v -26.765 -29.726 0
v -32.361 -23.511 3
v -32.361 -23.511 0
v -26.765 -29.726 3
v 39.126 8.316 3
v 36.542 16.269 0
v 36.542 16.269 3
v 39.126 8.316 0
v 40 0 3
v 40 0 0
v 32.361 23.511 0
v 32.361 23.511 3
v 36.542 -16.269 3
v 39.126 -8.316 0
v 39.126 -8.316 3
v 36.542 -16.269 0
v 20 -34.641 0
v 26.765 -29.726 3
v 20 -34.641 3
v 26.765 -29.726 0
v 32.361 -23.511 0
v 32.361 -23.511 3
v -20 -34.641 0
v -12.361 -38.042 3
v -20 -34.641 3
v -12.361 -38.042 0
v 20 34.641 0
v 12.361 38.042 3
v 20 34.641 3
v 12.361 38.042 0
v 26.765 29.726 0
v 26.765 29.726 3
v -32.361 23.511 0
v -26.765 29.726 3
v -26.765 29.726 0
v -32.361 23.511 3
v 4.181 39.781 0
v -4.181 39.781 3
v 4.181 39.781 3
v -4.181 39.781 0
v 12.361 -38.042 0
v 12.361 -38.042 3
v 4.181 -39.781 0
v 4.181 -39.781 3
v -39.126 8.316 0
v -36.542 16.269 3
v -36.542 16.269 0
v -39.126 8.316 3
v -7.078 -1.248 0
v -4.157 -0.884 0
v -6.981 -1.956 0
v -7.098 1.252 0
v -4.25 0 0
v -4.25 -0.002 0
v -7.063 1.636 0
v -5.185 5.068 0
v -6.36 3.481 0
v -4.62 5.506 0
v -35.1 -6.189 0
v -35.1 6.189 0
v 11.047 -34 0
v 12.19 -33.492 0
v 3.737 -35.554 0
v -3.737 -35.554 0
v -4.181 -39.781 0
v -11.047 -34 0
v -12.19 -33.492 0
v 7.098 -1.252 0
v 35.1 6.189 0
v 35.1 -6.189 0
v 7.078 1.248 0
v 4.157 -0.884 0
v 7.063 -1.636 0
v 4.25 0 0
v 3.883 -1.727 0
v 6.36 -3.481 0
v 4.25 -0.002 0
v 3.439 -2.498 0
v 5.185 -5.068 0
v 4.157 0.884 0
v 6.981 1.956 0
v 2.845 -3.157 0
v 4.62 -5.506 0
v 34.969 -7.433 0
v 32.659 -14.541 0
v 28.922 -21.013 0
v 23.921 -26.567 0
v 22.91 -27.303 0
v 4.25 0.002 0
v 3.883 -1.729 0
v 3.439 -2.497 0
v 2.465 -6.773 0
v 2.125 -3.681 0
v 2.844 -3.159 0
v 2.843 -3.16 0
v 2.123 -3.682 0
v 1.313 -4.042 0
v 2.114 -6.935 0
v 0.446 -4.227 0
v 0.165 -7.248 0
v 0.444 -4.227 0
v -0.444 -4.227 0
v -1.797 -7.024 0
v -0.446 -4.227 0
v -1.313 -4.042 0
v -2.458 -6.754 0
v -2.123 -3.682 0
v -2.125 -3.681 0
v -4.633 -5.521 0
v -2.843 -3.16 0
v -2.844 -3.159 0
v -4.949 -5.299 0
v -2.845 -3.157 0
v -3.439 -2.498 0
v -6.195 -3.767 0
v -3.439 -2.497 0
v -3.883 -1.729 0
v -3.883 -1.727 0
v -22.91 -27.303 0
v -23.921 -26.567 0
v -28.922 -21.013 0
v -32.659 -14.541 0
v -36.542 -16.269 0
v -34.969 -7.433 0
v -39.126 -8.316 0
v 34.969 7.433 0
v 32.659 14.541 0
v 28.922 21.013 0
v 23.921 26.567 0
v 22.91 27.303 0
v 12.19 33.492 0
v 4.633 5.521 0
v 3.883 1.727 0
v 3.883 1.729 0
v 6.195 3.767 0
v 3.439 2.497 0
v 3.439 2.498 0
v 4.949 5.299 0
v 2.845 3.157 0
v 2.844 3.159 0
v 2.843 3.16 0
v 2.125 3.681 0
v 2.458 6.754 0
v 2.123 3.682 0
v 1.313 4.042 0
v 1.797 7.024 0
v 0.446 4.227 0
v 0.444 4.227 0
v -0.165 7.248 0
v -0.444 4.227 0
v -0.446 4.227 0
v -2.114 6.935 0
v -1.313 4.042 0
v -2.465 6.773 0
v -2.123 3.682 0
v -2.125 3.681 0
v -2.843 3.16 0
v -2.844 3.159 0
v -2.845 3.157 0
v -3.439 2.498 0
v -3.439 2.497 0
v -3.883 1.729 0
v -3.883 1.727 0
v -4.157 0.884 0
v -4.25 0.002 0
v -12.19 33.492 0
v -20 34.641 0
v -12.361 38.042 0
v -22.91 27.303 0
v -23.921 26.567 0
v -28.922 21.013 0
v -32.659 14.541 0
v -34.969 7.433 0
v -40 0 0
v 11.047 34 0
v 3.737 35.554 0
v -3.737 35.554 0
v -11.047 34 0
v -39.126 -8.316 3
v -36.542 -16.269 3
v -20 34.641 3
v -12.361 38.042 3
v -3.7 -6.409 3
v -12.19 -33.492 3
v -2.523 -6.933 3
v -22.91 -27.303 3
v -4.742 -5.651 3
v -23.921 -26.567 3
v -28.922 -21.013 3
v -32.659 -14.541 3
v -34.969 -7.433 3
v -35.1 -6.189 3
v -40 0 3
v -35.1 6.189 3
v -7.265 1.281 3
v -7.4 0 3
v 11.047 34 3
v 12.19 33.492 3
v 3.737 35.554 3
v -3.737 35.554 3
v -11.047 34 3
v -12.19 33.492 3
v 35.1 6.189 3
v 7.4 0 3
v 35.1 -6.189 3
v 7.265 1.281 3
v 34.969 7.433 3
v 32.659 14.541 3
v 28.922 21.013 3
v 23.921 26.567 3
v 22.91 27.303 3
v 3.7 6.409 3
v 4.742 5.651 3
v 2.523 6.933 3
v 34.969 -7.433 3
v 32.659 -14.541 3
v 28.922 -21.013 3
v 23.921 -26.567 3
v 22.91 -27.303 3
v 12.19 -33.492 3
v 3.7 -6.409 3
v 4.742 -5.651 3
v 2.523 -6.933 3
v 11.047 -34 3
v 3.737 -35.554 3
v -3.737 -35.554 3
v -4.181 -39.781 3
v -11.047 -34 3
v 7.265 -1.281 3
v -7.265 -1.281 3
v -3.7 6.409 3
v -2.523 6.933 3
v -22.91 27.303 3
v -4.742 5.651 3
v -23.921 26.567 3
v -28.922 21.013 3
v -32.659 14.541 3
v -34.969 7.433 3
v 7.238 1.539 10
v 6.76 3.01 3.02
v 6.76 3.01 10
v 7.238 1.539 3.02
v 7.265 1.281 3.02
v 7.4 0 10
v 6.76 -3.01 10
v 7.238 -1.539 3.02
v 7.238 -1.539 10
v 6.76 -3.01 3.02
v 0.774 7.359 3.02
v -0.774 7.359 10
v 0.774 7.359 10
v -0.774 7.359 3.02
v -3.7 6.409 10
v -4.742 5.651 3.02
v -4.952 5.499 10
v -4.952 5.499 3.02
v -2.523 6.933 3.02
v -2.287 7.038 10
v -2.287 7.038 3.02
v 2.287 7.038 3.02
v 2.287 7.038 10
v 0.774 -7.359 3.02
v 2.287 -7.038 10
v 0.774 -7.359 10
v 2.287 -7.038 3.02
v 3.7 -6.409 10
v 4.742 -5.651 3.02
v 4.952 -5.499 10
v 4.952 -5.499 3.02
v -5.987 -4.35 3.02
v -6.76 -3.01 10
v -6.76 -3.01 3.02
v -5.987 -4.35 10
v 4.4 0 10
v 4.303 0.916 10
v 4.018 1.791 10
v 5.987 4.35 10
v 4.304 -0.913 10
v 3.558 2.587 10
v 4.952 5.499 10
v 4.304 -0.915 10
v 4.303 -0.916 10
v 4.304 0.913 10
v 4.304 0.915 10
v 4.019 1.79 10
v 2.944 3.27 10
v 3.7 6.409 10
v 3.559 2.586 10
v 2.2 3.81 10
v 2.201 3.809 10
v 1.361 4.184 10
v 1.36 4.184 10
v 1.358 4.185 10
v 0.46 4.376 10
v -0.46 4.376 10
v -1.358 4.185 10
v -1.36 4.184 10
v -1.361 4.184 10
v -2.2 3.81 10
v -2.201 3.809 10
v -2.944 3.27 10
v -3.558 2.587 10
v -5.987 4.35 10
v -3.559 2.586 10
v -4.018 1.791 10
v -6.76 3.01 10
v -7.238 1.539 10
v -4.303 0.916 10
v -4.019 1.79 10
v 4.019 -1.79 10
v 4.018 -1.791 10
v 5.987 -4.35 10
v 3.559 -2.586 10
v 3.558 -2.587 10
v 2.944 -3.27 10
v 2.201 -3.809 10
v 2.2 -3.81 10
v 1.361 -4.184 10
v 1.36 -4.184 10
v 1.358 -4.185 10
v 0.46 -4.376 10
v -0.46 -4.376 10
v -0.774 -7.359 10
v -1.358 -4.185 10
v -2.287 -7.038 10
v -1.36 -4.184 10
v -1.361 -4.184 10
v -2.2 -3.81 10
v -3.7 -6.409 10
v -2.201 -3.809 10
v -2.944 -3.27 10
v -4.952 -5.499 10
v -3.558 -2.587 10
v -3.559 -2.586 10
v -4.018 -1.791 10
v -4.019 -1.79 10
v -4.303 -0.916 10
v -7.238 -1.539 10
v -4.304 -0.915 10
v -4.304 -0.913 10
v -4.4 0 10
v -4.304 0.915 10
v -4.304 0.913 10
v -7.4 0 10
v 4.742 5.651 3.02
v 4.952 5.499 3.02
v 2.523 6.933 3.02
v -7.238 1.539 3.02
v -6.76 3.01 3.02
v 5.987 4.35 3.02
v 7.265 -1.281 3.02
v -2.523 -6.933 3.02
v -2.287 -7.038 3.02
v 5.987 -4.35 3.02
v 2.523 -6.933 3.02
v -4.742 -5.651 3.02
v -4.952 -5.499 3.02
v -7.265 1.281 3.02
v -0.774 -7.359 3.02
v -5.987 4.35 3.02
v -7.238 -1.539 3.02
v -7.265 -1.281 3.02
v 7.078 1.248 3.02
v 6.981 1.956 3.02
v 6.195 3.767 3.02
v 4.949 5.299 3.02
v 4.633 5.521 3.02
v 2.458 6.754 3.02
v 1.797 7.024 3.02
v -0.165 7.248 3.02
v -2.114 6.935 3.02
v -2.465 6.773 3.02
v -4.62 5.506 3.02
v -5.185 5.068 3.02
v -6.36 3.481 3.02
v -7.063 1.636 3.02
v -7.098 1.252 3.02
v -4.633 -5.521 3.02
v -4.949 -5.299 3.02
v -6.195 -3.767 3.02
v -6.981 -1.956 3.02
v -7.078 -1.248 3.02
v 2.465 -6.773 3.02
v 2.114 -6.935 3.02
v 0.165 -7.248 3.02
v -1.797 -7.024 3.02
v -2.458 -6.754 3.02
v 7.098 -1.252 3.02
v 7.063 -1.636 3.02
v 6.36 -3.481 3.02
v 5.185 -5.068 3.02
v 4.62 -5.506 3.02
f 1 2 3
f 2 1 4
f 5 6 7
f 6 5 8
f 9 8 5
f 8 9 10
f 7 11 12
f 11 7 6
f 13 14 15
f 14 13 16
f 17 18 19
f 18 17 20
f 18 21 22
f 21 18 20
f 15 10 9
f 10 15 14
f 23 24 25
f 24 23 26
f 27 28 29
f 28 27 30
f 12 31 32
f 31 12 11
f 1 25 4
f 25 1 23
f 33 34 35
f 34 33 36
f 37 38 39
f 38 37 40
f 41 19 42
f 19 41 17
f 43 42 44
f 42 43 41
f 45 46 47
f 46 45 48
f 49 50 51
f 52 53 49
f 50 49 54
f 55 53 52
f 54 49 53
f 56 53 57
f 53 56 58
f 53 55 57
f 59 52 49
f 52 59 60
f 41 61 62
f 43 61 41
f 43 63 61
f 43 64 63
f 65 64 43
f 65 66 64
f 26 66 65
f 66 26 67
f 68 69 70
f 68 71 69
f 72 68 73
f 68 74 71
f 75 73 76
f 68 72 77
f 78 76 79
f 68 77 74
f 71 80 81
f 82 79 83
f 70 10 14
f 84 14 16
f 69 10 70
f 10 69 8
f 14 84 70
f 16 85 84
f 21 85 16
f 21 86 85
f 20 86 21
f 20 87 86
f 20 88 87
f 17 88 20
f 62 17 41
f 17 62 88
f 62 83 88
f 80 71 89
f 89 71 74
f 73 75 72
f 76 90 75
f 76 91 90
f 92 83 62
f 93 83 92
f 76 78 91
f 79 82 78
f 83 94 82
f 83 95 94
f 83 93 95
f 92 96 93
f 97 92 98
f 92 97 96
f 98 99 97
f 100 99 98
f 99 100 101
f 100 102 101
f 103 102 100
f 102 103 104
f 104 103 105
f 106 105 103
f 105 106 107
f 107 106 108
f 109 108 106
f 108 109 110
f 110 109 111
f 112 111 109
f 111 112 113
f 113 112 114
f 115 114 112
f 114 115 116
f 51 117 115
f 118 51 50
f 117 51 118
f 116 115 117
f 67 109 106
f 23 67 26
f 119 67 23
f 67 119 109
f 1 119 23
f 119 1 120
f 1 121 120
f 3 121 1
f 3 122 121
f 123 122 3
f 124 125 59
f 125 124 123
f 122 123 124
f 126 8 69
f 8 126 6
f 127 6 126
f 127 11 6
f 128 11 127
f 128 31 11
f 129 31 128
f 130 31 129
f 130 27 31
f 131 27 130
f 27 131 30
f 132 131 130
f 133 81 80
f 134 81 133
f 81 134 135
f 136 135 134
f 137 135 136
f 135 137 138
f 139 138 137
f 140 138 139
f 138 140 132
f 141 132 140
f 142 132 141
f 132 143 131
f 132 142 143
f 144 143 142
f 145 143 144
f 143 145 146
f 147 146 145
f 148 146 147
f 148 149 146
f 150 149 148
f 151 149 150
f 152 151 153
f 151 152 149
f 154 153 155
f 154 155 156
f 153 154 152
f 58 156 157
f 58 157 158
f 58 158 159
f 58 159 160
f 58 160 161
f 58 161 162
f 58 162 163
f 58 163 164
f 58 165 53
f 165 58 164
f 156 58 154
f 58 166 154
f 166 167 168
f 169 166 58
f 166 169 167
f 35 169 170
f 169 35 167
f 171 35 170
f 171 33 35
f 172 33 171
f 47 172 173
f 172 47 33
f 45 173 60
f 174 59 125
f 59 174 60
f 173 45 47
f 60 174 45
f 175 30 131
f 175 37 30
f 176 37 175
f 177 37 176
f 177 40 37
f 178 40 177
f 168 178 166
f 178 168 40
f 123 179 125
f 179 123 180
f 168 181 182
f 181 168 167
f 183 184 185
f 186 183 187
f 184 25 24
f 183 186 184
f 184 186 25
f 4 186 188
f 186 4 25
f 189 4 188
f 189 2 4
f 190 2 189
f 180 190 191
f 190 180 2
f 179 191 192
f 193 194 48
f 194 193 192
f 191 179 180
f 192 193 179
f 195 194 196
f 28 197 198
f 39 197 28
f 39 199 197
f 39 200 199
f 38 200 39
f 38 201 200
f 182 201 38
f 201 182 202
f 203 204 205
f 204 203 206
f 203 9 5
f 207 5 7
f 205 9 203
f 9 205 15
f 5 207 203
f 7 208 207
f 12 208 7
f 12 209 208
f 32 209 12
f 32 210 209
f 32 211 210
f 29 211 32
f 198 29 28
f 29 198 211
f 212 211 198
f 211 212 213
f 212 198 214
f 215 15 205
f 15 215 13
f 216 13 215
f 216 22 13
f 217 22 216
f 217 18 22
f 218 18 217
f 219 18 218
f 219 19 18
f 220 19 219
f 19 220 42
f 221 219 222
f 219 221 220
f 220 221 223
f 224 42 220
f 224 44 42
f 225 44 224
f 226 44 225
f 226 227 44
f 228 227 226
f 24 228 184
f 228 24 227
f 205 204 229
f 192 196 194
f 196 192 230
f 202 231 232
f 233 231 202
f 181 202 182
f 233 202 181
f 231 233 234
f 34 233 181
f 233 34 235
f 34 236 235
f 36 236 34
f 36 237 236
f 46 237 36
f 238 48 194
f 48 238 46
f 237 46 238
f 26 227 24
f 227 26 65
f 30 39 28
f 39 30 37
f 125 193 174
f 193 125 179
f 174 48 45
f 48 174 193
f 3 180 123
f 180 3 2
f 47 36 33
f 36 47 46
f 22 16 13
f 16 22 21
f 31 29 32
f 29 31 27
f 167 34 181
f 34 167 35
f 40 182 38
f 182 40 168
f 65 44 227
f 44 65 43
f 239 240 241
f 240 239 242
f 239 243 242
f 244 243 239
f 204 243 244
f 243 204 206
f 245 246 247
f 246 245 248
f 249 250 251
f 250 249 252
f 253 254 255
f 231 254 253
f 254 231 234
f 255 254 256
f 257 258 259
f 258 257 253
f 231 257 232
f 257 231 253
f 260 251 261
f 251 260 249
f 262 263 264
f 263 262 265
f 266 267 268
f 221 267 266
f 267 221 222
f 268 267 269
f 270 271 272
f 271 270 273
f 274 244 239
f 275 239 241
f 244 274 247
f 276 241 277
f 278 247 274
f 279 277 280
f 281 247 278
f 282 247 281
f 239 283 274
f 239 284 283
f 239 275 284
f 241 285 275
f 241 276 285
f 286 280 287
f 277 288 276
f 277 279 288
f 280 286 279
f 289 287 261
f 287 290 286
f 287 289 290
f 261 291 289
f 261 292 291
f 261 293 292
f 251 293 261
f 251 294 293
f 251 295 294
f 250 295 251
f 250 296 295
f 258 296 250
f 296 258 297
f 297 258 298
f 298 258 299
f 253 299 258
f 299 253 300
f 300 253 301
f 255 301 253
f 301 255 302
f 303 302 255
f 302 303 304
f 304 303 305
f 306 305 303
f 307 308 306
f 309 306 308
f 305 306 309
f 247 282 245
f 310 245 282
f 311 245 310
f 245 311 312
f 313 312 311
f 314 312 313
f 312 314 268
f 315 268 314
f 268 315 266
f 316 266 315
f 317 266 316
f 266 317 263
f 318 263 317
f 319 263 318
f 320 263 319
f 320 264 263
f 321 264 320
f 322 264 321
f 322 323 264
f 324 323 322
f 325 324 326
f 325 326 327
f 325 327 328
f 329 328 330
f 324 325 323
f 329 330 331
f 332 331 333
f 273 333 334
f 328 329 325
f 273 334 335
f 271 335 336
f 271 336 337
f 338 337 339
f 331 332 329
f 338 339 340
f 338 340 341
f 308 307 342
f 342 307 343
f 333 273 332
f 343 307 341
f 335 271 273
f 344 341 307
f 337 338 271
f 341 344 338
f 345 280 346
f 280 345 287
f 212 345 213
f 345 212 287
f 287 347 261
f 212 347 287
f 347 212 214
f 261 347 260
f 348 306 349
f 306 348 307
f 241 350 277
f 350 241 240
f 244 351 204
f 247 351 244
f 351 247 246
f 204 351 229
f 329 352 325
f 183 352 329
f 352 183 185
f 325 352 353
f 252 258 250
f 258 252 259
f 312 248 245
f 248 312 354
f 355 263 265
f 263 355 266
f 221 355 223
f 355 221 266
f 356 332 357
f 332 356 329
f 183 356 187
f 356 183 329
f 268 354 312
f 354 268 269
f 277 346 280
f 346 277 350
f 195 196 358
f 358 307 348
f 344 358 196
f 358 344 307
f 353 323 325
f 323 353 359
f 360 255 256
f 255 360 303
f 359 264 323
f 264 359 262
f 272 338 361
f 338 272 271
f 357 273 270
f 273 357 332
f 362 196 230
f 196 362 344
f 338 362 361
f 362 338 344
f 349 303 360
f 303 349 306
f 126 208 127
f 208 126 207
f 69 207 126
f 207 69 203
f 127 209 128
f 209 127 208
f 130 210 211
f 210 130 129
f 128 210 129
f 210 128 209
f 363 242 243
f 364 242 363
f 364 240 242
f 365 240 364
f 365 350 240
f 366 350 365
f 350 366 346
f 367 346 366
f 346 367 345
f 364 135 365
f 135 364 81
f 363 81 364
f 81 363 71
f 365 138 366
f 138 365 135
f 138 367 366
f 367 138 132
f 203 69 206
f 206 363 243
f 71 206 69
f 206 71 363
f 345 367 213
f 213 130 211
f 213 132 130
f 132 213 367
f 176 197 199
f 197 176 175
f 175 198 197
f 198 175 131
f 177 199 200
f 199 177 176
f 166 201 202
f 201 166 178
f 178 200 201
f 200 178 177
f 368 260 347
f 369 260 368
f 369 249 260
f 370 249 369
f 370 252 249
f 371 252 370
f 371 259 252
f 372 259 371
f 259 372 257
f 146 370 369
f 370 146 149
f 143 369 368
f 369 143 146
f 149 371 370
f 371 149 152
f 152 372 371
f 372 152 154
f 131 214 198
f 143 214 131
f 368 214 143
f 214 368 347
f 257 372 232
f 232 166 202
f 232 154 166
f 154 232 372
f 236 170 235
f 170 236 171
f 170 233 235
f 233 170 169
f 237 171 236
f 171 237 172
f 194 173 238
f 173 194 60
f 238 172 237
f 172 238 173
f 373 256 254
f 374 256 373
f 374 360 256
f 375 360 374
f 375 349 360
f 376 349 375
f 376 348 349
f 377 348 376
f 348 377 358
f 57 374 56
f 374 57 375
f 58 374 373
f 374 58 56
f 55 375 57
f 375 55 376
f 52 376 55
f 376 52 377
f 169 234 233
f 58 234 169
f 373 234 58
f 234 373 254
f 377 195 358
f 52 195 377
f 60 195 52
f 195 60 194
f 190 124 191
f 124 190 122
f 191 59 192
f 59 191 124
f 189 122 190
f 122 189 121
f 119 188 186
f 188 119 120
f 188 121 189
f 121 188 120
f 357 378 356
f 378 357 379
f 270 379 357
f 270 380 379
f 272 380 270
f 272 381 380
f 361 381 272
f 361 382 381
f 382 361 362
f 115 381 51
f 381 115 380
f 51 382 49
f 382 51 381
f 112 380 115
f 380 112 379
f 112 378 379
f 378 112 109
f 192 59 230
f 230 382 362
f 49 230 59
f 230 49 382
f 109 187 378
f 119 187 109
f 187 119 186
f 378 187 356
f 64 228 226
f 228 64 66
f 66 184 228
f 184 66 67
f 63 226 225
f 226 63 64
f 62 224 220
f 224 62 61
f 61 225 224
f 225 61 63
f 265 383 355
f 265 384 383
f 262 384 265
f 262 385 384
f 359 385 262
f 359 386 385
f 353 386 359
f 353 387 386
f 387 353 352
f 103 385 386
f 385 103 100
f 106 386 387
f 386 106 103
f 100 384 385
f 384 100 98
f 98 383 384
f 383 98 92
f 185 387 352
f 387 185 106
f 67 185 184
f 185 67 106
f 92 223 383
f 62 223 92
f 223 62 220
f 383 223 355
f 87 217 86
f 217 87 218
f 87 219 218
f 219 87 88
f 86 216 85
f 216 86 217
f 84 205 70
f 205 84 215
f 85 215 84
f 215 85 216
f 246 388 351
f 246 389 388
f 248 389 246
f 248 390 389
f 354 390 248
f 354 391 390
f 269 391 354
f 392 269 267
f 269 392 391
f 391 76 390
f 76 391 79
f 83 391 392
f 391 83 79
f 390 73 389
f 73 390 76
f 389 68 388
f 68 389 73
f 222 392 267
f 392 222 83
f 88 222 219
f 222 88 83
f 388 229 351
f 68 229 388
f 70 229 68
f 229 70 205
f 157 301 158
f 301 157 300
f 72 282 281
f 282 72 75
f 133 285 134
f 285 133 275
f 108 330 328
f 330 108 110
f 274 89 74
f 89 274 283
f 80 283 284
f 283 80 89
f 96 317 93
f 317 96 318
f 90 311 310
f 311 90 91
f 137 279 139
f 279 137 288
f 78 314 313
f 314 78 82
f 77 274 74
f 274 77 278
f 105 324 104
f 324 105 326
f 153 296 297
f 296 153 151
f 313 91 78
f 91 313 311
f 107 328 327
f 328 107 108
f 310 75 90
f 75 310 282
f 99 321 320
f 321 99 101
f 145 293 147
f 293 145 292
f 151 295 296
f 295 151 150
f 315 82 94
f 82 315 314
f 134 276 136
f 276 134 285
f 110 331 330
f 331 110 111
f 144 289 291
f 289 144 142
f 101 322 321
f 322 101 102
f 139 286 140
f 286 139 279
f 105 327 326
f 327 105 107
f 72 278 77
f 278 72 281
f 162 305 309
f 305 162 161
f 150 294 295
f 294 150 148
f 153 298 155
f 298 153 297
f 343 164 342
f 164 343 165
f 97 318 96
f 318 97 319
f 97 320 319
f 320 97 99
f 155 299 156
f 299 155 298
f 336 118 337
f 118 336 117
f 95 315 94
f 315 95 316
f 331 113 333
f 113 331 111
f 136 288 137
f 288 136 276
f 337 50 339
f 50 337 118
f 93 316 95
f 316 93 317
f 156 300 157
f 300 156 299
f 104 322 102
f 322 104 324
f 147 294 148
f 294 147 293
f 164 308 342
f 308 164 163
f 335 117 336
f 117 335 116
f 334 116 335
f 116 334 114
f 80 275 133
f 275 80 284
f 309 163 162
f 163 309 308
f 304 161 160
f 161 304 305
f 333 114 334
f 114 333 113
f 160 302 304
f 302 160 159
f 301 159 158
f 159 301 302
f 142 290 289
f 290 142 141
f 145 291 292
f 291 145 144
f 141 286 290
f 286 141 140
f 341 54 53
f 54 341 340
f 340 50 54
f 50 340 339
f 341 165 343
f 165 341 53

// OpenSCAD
e=0.02;
e2=e*2;

pen_neck_d1 = 8.5;
pen_neck_d2 = 8.8;
pen_neck_h = 8;
pen_tip_h_min = 5;
pen_tip_over = 3;
body_h=3;
body_d=80;
wall_w = 3;
fn=30;

hole_h = pen_tip_h_min + pen_neck_h - pen_tip_over;
echo(hole_h);
difference() {
    union() {
        cylinder(d = body_d, h = body_h, $fn = fn);
        cylinder(d = 2*wall_w + pen_neck_d2, h = hole_h, $fn = fn);
    }
    translate([0,0,-e]) {
        cylinder(d1 = pen_neck_d1, 
                 d2 = pen_neck_d2, 
                 h = hole_h + e2, $fn = fn);
        union() {
            for(a=[0:60:359]) rotate(a) {
                intersection() {
                    difference() {
                        cylinder( d = body_d - pen_neck_d1,
                                  h = body_h + e2);
                        cylinder( d = pen_neck_d1 + 2*wall_w,
                                  h = body_h + e2 );
                    }
                    linear_extrude(height = body_h + e2) {
                        polygon(points=[[0,0],
                                         [body_d, body_d * tan(10)],
                        [body_d, body_d * tan(60-10)]]);
                    }
                }
            }
        }
    }
    
}
